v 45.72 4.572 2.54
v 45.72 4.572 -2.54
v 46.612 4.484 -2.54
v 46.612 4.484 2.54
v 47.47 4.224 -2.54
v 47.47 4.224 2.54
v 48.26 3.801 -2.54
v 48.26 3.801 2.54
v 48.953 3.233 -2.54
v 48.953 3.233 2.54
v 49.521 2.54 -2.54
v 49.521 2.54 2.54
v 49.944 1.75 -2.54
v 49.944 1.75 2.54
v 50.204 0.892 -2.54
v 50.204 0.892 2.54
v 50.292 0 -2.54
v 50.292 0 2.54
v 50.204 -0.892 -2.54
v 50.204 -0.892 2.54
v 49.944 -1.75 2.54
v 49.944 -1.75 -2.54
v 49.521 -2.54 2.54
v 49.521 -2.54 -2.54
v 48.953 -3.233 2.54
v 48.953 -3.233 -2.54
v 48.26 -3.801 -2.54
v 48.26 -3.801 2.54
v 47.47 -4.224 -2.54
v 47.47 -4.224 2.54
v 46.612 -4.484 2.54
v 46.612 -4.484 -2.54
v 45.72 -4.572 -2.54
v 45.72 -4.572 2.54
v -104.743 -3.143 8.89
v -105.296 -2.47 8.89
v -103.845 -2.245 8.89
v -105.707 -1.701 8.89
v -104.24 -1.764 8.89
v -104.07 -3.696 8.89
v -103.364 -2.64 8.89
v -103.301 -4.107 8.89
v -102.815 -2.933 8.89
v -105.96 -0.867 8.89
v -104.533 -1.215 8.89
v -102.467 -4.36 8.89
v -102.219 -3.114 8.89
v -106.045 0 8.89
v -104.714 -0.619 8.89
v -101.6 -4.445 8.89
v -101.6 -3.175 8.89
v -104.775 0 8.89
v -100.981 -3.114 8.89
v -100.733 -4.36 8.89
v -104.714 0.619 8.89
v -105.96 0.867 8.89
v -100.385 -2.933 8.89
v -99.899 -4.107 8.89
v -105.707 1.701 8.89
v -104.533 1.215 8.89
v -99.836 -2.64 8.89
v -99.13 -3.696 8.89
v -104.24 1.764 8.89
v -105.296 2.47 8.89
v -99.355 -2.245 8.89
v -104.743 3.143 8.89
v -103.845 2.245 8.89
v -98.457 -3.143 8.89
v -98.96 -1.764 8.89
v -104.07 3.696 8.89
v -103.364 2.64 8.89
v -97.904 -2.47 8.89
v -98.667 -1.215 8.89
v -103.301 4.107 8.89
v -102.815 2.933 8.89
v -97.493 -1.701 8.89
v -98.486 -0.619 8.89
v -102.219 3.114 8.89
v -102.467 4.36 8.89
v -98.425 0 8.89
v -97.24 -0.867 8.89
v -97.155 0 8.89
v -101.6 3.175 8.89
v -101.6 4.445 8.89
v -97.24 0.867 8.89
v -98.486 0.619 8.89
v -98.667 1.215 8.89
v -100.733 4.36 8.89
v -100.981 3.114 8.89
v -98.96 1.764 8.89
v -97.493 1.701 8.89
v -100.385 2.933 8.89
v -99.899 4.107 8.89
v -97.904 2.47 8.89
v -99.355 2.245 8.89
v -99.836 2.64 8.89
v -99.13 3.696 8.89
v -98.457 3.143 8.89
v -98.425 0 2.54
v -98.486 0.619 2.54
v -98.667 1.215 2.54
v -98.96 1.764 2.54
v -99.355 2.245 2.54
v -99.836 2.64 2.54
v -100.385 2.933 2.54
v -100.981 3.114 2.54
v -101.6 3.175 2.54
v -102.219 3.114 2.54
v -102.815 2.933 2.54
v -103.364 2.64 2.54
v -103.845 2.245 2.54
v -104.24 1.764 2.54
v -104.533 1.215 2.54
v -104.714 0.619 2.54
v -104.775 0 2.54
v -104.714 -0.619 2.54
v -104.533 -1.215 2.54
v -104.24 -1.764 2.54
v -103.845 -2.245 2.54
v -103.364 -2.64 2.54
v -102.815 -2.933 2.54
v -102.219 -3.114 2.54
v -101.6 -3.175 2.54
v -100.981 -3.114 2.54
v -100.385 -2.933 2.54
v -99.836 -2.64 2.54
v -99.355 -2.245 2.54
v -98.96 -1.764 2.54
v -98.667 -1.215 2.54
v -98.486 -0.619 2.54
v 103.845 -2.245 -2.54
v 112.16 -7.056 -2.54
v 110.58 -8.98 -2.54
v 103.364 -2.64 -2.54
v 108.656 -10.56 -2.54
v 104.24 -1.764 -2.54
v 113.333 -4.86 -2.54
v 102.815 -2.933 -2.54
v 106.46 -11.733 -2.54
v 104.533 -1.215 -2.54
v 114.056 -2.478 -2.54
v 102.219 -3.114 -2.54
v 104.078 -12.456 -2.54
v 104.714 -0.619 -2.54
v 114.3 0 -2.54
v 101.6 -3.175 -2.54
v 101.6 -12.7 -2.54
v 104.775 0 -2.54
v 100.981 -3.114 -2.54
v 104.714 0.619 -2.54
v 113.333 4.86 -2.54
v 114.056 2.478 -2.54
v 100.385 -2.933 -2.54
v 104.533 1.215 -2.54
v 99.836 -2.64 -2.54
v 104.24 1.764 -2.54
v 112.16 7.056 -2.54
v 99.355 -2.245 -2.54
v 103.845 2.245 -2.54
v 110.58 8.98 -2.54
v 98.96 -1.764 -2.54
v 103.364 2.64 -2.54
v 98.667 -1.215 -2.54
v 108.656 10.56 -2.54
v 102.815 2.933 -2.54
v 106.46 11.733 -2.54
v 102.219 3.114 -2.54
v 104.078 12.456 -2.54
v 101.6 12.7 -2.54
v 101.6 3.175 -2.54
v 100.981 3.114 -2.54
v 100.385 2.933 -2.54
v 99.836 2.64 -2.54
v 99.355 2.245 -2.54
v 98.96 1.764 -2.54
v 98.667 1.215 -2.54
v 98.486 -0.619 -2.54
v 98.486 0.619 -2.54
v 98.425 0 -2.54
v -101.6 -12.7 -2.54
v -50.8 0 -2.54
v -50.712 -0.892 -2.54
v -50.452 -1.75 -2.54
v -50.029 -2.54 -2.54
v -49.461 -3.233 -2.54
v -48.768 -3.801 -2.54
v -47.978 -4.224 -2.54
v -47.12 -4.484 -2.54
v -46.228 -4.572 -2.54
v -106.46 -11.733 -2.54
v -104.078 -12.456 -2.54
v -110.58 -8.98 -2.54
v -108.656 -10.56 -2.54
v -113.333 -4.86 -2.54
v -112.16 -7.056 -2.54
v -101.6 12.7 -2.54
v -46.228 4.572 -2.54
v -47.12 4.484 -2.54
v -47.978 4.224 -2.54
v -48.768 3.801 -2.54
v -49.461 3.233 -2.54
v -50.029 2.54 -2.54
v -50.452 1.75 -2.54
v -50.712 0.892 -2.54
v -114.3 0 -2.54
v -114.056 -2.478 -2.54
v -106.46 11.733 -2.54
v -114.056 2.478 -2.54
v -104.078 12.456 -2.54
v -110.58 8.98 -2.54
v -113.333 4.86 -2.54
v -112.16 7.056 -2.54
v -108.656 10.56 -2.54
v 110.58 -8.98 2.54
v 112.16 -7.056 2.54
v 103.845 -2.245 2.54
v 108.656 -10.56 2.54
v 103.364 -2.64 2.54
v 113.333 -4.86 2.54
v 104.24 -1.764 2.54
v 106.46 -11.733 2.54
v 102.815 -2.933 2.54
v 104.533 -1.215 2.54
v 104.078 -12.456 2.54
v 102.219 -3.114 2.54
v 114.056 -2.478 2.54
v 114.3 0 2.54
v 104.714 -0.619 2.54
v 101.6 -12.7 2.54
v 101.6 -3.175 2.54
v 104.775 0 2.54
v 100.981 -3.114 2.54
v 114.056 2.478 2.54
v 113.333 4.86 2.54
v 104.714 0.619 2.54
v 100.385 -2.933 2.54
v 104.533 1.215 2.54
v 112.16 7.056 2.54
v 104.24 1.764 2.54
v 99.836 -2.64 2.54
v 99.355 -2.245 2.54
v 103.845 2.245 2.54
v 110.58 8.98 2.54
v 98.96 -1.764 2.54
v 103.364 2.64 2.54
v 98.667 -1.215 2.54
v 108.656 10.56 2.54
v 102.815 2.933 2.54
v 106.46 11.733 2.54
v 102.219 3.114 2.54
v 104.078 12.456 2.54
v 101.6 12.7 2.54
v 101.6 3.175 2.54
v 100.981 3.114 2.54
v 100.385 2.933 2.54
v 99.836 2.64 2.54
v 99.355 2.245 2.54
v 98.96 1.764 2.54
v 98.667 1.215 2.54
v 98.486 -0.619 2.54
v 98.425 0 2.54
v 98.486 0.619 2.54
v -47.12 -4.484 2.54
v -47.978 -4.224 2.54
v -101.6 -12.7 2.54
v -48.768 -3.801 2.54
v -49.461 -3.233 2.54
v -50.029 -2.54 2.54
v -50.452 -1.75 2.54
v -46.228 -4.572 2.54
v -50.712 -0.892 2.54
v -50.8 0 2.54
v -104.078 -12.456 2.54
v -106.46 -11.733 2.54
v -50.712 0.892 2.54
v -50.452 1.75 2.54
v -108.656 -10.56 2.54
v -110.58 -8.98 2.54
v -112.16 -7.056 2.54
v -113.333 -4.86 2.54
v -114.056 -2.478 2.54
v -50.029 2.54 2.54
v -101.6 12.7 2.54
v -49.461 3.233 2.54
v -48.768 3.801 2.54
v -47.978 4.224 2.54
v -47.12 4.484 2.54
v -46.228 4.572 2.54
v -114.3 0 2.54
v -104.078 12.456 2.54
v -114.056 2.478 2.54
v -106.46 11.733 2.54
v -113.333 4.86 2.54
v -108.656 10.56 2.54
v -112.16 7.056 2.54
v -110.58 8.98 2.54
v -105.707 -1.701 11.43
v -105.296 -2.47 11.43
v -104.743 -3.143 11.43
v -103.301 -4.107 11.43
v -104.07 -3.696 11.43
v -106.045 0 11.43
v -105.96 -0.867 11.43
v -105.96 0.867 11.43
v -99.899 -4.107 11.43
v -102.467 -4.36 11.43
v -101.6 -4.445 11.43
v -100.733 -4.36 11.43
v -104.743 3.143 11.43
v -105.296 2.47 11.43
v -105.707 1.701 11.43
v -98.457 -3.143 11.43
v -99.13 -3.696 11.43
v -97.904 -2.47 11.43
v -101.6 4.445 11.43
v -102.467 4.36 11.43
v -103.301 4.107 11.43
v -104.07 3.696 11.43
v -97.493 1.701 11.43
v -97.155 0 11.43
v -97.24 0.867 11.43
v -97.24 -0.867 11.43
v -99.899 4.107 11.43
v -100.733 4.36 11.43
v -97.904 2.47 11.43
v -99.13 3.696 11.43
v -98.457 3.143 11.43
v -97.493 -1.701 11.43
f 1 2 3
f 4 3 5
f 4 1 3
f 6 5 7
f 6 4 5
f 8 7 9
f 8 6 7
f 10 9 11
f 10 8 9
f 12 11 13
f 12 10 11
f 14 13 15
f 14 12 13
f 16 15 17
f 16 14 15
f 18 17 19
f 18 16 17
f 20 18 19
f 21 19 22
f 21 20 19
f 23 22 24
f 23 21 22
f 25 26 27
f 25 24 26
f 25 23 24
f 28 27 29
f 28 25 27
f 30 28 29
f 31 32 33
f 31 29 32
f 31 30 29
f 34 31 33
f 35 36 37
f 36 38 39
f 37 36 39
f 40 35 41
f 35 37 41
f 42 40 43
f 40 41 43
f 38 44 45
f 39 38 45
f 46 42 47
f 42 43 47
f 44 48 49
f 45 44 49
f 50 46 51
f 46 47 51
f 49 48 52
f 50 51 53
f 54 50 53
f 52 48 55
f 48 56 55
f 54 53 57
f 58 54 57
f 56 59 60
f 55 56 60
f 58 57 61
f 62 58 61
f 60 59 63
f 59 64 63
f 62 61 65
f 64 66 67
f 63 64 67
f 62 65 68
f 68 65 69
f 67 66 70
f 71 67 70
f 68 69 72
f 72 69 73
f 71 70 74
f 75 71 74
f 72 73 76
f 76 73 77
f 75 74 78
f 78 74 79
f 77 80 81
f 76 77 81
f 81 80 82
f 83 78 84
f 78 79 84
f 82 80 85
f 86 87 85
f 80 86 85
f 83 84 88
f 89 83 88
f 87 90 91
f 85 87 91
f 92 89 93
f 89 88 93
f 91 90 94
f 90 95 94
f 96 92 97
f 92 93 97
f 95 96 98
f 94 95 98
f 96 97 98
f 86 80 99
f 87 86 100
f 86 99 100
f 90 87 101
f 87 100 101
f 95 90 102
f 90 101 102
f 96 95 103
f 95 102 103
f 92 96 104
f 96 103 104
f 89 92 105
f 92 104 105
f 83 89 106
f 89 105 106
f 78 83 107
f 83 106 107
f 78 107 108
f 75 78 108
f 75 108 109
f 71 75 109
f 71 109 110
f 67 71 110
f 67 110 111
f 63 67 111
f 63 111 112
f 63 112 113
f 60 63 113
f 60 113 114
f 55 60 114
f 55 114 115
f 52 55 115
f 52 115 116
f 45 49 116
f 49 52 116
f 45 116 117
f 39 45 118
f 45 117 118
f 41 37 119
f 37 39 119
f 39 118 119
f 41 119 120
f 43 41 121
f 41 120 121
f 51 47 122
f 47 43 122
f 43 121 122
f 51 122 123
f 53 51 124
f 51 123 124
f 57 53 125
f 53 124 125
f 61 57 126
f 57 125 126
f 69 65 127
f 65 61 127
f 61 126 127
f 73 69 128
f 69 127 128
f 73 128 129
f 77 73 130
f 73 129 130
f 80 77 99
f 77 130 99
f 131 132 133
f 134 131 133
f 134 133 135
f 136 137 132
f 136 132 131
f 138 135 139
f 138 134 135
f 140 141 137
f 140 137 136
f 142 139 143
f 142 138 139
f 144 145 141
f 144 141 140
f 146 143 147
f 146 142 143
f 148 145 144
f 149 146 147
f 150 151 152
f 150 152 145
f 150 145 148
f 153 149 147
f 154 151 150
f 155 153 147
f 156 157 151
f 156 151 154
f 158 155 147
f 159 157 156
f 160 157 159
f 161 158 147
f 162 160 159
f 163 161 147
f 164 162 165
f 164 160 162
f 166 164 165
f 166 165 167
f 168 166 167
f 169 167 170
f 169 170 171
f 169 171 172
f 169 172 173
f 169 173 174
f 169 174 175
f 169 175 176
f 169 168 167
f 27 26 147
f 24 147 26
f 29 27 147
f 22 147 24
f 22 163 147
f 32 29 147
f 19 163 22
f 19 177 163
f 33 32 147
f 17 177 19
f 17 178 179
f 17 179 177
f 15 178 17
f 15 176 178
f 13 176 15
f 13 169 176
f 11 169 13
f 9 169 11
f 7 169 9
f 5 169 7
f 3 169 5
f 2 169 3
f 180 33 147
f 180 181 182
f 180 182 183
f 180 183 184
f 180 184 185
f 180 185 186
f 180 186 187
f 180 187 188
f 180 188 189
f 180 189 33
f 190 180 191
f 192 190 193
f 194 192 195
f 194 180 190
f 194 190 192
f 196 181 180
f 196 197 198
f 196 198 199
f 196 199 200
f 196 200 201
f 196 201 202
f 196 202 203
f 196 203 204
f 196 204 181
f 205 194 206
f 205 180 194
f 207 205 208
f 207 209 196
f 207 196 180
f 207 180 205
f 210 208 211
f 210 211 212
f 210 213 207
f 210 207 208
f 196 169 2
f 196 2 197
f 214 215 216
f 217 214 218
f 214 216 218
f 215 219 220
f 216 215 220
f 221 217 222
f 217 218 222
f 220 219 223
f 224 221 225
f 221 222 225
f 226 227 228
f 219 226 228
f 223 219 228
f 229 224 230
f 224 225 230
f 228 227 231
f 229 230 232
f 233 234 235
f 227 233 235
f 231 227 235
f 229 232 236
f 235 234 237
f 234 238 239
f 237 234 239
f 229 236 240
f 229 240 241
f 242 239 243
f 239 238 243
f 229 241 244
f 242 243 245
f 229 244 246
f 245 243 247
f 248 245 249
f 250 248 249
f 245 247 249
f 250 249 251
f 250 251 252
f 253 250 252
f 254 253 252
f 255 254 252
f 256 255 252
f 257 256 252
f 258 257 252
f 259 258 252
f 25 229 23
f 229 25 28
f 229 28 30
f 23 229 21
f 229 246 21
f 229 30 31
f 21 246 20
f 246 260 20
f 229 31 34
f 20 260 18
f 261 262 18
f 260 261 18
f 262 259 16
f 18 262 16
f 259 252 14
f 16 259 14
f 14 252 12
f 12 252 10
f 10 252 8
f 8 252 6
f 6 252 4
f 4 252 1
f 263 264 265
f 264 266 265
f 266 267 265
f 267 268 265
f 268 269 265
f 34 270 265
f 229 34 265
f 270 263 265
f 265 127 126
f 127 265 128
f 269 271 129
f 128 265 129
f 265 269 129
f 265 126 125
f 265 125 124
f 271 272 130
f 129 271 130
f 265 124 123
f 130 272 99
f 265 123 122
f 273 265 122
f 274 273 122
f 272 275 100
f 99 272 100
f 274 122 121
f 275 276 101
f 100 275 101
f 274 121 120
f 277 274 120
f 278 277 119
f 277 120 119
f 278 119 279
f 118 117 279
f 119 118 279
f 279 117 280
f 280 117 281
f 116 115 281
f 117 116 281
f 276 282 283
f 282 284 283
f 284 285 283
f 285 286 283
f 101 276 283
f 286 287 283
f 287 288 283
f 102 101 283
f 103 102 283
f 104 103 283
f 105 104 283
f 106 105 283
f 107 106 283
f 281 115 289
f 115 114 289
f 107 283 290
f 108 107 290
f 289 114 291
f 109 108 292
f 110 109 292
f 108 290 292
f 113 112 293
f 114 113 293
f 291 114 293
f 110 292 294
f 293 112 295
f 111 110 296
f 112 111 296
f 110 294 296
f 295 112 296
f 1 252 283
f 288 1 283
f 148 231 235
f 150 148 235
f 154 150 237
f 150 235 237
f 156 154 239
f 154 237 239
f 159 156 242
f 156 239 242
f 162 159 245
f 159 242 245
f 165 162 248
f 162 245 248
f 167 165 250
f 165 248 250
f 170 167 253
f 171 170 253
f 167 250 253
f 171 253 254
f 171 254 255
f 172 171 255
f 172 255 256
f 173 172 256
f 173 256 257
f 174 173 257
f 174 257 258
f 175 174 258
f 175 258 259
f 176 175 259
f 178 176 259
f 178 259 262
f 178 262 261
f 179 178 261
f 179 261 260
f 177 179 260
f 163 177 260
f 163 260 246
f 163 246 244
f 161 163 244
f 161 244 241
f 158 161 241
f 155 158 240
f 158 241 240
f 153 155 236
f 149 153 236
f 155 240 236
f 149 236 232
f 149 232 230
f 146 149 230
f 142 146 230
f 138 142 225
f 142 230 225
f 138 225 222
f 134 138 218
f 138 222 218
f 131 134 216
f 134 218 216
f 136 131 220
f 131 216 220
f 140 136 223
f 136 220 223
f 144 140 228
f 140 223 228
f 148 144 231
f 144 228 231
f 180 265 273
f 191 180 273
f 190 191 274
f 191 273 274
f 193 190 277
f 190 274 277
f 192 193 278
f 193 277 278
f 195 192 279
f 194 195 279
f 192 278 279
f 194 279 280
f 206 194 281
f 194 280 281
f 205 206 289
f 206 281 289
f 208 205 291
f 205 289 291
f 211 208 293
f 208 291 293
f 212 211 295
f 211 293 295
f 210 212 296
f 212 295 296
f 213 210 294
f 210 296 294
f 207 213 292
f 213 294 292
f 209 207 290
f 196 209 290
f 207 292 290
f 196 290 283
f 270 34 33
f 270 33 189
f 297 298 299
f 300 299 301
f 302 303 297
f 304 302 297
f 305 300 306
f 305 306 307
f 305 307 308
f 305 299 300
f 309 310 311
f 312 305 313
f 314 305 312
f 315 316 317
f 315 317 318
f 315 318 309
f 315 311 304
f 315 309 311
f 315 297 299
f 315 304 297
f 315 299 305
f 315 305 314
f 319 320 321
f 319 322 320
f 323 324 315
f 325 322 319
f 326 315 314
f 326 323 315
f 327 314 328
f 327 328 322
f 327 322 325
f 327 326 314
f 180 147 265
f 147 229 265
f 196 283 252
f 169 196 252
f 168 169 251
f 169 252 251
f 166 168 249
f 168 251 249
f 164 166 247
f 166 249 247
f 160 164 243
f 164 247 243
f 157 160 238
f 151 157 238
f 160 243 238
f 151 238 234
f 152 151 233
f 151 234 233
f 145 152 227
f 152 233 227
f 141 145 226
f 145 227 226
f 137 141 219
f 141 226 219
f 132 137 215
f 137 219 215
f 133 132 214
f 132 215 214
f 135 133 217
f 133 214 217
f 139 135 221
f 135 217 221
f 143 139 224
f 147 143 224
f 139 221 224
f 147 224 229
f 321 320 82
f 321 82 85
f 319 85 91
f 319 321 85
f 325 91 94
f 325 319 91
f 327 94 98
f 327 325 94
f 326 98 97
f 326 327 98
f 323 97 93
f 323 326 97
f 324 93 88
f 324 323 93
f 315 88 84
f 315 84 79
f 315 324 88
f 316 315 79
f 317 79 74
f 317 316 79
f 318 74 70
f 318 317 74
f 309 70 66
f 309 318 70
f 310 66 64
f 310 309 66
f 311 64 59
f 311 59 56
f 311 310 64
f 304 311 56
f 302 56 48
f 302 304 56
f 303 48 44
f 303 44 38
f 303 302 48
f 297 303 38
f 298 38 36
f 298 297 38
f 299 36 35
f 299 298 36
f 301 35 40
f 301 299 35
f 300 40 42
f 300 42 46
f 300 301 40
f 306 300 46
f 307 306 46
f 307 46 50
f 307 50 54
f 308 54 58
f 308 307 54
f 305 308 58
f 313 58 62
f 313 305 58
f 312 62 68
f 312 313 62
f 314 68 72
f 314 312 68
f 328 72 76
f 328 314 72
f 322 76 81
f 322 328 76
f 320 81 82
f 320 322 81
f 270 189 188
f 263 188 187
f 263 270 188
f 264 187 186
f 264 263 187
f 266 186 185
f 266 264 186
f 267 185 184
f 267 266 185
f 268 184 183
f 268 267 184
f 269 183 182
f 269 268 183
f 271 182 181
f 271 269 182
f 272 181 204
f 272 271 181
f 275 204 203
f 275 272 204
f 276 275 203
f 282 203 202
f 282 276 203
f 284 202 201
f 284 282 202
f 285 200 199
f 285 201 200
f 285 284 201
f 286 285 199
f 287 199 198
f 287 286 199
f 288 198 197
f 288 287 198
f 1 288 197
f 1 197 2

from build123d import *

# Parameters (mm, degrees)
BOSS_EXTRUDE1_DEPTH = 2.54
SKETCH2_R           = 3.175
CUT_EXTRUDE1_DEPTH  = 116.115535007
CUT_EXTRUDE2_DEPTH  = 116.115535007
SKETCH4_R           = 3.175
BOSS_EXTRUDE2_DEPTH = 8.89
SKETCH5_R           = 4.445
BOSS_EXTRUDE3_DEPTH = 2.54


with BuildPart() as part:
    # Sketch1 → Boss-Extrude1 (new, symmetric)
    with BuildSketch(Plane.XY):
        with BuildLine():
            Line((-101.6, 12.7), (101.6, 12.7))
            ThreePointArc((101.6, 12.7), (114.3, 0), (101.6, -12.7))
            Line((101.6, -12.7), (-101.6, -12.7))
            ThreePointArc((-101.6, -12.7), (-114.3, 0), (-101.6, 12.7))
        make_face()
    extrude(amount=BOSS_EXTRUDE1_DEPTH, both=True)

    # Sketch2 → Cut-Extrude1 (cut, through all)
    with BuildSketch(Plane.XY.offset(2.54)):
        with Locations((101.6, 0)):
            Circle(SKETCH2_R)
    extrude(amount=-CUT_EXTRUDE1_DEPTH, mode=Mode.SUBTRACT)

    # Sketch3 → Cut-Extrude2 (cut, through all)
    with BuildSketch(Plane.XY.offset(2.54)):
        with BuildLine():
            Line((-46.228, 4.572), (45.72, 4.572))
            ThreePointArc((45.72, 4.572), (50.292, 0), (45.72, -4.572))
            Line((45.72, -4.572), (-46.228, -4.572))
            ThreePointArc((-46.228, -4.572), (-50.8, 0), (-46.228, 4.572))
        make_face()
    extrude(amount=-CUT_EXTRUDE2_DEPTH, mode=Mode.SUBTRACT)

    # Sketch4 → Boss-Extrude2 (add)
    with BuildSketch(Plane.XY.offset(2.54)):
        with Locations((-101.6, 0)):
            Circle(SKETCH4_R)
    extrude(amount=BOSS_EXTRUDE2_DEPTH)

    # Sketch5 → Boss-Extrude3 (add)
    with BuildSketch(Plane.XY.offset(11.43)):
        with Locations((-101.6, 0)):
            Circle(SKETCH5_R)
    extrude(amount=-BOSS_EXTRUDE3_DEPTH)


solid = part.part
